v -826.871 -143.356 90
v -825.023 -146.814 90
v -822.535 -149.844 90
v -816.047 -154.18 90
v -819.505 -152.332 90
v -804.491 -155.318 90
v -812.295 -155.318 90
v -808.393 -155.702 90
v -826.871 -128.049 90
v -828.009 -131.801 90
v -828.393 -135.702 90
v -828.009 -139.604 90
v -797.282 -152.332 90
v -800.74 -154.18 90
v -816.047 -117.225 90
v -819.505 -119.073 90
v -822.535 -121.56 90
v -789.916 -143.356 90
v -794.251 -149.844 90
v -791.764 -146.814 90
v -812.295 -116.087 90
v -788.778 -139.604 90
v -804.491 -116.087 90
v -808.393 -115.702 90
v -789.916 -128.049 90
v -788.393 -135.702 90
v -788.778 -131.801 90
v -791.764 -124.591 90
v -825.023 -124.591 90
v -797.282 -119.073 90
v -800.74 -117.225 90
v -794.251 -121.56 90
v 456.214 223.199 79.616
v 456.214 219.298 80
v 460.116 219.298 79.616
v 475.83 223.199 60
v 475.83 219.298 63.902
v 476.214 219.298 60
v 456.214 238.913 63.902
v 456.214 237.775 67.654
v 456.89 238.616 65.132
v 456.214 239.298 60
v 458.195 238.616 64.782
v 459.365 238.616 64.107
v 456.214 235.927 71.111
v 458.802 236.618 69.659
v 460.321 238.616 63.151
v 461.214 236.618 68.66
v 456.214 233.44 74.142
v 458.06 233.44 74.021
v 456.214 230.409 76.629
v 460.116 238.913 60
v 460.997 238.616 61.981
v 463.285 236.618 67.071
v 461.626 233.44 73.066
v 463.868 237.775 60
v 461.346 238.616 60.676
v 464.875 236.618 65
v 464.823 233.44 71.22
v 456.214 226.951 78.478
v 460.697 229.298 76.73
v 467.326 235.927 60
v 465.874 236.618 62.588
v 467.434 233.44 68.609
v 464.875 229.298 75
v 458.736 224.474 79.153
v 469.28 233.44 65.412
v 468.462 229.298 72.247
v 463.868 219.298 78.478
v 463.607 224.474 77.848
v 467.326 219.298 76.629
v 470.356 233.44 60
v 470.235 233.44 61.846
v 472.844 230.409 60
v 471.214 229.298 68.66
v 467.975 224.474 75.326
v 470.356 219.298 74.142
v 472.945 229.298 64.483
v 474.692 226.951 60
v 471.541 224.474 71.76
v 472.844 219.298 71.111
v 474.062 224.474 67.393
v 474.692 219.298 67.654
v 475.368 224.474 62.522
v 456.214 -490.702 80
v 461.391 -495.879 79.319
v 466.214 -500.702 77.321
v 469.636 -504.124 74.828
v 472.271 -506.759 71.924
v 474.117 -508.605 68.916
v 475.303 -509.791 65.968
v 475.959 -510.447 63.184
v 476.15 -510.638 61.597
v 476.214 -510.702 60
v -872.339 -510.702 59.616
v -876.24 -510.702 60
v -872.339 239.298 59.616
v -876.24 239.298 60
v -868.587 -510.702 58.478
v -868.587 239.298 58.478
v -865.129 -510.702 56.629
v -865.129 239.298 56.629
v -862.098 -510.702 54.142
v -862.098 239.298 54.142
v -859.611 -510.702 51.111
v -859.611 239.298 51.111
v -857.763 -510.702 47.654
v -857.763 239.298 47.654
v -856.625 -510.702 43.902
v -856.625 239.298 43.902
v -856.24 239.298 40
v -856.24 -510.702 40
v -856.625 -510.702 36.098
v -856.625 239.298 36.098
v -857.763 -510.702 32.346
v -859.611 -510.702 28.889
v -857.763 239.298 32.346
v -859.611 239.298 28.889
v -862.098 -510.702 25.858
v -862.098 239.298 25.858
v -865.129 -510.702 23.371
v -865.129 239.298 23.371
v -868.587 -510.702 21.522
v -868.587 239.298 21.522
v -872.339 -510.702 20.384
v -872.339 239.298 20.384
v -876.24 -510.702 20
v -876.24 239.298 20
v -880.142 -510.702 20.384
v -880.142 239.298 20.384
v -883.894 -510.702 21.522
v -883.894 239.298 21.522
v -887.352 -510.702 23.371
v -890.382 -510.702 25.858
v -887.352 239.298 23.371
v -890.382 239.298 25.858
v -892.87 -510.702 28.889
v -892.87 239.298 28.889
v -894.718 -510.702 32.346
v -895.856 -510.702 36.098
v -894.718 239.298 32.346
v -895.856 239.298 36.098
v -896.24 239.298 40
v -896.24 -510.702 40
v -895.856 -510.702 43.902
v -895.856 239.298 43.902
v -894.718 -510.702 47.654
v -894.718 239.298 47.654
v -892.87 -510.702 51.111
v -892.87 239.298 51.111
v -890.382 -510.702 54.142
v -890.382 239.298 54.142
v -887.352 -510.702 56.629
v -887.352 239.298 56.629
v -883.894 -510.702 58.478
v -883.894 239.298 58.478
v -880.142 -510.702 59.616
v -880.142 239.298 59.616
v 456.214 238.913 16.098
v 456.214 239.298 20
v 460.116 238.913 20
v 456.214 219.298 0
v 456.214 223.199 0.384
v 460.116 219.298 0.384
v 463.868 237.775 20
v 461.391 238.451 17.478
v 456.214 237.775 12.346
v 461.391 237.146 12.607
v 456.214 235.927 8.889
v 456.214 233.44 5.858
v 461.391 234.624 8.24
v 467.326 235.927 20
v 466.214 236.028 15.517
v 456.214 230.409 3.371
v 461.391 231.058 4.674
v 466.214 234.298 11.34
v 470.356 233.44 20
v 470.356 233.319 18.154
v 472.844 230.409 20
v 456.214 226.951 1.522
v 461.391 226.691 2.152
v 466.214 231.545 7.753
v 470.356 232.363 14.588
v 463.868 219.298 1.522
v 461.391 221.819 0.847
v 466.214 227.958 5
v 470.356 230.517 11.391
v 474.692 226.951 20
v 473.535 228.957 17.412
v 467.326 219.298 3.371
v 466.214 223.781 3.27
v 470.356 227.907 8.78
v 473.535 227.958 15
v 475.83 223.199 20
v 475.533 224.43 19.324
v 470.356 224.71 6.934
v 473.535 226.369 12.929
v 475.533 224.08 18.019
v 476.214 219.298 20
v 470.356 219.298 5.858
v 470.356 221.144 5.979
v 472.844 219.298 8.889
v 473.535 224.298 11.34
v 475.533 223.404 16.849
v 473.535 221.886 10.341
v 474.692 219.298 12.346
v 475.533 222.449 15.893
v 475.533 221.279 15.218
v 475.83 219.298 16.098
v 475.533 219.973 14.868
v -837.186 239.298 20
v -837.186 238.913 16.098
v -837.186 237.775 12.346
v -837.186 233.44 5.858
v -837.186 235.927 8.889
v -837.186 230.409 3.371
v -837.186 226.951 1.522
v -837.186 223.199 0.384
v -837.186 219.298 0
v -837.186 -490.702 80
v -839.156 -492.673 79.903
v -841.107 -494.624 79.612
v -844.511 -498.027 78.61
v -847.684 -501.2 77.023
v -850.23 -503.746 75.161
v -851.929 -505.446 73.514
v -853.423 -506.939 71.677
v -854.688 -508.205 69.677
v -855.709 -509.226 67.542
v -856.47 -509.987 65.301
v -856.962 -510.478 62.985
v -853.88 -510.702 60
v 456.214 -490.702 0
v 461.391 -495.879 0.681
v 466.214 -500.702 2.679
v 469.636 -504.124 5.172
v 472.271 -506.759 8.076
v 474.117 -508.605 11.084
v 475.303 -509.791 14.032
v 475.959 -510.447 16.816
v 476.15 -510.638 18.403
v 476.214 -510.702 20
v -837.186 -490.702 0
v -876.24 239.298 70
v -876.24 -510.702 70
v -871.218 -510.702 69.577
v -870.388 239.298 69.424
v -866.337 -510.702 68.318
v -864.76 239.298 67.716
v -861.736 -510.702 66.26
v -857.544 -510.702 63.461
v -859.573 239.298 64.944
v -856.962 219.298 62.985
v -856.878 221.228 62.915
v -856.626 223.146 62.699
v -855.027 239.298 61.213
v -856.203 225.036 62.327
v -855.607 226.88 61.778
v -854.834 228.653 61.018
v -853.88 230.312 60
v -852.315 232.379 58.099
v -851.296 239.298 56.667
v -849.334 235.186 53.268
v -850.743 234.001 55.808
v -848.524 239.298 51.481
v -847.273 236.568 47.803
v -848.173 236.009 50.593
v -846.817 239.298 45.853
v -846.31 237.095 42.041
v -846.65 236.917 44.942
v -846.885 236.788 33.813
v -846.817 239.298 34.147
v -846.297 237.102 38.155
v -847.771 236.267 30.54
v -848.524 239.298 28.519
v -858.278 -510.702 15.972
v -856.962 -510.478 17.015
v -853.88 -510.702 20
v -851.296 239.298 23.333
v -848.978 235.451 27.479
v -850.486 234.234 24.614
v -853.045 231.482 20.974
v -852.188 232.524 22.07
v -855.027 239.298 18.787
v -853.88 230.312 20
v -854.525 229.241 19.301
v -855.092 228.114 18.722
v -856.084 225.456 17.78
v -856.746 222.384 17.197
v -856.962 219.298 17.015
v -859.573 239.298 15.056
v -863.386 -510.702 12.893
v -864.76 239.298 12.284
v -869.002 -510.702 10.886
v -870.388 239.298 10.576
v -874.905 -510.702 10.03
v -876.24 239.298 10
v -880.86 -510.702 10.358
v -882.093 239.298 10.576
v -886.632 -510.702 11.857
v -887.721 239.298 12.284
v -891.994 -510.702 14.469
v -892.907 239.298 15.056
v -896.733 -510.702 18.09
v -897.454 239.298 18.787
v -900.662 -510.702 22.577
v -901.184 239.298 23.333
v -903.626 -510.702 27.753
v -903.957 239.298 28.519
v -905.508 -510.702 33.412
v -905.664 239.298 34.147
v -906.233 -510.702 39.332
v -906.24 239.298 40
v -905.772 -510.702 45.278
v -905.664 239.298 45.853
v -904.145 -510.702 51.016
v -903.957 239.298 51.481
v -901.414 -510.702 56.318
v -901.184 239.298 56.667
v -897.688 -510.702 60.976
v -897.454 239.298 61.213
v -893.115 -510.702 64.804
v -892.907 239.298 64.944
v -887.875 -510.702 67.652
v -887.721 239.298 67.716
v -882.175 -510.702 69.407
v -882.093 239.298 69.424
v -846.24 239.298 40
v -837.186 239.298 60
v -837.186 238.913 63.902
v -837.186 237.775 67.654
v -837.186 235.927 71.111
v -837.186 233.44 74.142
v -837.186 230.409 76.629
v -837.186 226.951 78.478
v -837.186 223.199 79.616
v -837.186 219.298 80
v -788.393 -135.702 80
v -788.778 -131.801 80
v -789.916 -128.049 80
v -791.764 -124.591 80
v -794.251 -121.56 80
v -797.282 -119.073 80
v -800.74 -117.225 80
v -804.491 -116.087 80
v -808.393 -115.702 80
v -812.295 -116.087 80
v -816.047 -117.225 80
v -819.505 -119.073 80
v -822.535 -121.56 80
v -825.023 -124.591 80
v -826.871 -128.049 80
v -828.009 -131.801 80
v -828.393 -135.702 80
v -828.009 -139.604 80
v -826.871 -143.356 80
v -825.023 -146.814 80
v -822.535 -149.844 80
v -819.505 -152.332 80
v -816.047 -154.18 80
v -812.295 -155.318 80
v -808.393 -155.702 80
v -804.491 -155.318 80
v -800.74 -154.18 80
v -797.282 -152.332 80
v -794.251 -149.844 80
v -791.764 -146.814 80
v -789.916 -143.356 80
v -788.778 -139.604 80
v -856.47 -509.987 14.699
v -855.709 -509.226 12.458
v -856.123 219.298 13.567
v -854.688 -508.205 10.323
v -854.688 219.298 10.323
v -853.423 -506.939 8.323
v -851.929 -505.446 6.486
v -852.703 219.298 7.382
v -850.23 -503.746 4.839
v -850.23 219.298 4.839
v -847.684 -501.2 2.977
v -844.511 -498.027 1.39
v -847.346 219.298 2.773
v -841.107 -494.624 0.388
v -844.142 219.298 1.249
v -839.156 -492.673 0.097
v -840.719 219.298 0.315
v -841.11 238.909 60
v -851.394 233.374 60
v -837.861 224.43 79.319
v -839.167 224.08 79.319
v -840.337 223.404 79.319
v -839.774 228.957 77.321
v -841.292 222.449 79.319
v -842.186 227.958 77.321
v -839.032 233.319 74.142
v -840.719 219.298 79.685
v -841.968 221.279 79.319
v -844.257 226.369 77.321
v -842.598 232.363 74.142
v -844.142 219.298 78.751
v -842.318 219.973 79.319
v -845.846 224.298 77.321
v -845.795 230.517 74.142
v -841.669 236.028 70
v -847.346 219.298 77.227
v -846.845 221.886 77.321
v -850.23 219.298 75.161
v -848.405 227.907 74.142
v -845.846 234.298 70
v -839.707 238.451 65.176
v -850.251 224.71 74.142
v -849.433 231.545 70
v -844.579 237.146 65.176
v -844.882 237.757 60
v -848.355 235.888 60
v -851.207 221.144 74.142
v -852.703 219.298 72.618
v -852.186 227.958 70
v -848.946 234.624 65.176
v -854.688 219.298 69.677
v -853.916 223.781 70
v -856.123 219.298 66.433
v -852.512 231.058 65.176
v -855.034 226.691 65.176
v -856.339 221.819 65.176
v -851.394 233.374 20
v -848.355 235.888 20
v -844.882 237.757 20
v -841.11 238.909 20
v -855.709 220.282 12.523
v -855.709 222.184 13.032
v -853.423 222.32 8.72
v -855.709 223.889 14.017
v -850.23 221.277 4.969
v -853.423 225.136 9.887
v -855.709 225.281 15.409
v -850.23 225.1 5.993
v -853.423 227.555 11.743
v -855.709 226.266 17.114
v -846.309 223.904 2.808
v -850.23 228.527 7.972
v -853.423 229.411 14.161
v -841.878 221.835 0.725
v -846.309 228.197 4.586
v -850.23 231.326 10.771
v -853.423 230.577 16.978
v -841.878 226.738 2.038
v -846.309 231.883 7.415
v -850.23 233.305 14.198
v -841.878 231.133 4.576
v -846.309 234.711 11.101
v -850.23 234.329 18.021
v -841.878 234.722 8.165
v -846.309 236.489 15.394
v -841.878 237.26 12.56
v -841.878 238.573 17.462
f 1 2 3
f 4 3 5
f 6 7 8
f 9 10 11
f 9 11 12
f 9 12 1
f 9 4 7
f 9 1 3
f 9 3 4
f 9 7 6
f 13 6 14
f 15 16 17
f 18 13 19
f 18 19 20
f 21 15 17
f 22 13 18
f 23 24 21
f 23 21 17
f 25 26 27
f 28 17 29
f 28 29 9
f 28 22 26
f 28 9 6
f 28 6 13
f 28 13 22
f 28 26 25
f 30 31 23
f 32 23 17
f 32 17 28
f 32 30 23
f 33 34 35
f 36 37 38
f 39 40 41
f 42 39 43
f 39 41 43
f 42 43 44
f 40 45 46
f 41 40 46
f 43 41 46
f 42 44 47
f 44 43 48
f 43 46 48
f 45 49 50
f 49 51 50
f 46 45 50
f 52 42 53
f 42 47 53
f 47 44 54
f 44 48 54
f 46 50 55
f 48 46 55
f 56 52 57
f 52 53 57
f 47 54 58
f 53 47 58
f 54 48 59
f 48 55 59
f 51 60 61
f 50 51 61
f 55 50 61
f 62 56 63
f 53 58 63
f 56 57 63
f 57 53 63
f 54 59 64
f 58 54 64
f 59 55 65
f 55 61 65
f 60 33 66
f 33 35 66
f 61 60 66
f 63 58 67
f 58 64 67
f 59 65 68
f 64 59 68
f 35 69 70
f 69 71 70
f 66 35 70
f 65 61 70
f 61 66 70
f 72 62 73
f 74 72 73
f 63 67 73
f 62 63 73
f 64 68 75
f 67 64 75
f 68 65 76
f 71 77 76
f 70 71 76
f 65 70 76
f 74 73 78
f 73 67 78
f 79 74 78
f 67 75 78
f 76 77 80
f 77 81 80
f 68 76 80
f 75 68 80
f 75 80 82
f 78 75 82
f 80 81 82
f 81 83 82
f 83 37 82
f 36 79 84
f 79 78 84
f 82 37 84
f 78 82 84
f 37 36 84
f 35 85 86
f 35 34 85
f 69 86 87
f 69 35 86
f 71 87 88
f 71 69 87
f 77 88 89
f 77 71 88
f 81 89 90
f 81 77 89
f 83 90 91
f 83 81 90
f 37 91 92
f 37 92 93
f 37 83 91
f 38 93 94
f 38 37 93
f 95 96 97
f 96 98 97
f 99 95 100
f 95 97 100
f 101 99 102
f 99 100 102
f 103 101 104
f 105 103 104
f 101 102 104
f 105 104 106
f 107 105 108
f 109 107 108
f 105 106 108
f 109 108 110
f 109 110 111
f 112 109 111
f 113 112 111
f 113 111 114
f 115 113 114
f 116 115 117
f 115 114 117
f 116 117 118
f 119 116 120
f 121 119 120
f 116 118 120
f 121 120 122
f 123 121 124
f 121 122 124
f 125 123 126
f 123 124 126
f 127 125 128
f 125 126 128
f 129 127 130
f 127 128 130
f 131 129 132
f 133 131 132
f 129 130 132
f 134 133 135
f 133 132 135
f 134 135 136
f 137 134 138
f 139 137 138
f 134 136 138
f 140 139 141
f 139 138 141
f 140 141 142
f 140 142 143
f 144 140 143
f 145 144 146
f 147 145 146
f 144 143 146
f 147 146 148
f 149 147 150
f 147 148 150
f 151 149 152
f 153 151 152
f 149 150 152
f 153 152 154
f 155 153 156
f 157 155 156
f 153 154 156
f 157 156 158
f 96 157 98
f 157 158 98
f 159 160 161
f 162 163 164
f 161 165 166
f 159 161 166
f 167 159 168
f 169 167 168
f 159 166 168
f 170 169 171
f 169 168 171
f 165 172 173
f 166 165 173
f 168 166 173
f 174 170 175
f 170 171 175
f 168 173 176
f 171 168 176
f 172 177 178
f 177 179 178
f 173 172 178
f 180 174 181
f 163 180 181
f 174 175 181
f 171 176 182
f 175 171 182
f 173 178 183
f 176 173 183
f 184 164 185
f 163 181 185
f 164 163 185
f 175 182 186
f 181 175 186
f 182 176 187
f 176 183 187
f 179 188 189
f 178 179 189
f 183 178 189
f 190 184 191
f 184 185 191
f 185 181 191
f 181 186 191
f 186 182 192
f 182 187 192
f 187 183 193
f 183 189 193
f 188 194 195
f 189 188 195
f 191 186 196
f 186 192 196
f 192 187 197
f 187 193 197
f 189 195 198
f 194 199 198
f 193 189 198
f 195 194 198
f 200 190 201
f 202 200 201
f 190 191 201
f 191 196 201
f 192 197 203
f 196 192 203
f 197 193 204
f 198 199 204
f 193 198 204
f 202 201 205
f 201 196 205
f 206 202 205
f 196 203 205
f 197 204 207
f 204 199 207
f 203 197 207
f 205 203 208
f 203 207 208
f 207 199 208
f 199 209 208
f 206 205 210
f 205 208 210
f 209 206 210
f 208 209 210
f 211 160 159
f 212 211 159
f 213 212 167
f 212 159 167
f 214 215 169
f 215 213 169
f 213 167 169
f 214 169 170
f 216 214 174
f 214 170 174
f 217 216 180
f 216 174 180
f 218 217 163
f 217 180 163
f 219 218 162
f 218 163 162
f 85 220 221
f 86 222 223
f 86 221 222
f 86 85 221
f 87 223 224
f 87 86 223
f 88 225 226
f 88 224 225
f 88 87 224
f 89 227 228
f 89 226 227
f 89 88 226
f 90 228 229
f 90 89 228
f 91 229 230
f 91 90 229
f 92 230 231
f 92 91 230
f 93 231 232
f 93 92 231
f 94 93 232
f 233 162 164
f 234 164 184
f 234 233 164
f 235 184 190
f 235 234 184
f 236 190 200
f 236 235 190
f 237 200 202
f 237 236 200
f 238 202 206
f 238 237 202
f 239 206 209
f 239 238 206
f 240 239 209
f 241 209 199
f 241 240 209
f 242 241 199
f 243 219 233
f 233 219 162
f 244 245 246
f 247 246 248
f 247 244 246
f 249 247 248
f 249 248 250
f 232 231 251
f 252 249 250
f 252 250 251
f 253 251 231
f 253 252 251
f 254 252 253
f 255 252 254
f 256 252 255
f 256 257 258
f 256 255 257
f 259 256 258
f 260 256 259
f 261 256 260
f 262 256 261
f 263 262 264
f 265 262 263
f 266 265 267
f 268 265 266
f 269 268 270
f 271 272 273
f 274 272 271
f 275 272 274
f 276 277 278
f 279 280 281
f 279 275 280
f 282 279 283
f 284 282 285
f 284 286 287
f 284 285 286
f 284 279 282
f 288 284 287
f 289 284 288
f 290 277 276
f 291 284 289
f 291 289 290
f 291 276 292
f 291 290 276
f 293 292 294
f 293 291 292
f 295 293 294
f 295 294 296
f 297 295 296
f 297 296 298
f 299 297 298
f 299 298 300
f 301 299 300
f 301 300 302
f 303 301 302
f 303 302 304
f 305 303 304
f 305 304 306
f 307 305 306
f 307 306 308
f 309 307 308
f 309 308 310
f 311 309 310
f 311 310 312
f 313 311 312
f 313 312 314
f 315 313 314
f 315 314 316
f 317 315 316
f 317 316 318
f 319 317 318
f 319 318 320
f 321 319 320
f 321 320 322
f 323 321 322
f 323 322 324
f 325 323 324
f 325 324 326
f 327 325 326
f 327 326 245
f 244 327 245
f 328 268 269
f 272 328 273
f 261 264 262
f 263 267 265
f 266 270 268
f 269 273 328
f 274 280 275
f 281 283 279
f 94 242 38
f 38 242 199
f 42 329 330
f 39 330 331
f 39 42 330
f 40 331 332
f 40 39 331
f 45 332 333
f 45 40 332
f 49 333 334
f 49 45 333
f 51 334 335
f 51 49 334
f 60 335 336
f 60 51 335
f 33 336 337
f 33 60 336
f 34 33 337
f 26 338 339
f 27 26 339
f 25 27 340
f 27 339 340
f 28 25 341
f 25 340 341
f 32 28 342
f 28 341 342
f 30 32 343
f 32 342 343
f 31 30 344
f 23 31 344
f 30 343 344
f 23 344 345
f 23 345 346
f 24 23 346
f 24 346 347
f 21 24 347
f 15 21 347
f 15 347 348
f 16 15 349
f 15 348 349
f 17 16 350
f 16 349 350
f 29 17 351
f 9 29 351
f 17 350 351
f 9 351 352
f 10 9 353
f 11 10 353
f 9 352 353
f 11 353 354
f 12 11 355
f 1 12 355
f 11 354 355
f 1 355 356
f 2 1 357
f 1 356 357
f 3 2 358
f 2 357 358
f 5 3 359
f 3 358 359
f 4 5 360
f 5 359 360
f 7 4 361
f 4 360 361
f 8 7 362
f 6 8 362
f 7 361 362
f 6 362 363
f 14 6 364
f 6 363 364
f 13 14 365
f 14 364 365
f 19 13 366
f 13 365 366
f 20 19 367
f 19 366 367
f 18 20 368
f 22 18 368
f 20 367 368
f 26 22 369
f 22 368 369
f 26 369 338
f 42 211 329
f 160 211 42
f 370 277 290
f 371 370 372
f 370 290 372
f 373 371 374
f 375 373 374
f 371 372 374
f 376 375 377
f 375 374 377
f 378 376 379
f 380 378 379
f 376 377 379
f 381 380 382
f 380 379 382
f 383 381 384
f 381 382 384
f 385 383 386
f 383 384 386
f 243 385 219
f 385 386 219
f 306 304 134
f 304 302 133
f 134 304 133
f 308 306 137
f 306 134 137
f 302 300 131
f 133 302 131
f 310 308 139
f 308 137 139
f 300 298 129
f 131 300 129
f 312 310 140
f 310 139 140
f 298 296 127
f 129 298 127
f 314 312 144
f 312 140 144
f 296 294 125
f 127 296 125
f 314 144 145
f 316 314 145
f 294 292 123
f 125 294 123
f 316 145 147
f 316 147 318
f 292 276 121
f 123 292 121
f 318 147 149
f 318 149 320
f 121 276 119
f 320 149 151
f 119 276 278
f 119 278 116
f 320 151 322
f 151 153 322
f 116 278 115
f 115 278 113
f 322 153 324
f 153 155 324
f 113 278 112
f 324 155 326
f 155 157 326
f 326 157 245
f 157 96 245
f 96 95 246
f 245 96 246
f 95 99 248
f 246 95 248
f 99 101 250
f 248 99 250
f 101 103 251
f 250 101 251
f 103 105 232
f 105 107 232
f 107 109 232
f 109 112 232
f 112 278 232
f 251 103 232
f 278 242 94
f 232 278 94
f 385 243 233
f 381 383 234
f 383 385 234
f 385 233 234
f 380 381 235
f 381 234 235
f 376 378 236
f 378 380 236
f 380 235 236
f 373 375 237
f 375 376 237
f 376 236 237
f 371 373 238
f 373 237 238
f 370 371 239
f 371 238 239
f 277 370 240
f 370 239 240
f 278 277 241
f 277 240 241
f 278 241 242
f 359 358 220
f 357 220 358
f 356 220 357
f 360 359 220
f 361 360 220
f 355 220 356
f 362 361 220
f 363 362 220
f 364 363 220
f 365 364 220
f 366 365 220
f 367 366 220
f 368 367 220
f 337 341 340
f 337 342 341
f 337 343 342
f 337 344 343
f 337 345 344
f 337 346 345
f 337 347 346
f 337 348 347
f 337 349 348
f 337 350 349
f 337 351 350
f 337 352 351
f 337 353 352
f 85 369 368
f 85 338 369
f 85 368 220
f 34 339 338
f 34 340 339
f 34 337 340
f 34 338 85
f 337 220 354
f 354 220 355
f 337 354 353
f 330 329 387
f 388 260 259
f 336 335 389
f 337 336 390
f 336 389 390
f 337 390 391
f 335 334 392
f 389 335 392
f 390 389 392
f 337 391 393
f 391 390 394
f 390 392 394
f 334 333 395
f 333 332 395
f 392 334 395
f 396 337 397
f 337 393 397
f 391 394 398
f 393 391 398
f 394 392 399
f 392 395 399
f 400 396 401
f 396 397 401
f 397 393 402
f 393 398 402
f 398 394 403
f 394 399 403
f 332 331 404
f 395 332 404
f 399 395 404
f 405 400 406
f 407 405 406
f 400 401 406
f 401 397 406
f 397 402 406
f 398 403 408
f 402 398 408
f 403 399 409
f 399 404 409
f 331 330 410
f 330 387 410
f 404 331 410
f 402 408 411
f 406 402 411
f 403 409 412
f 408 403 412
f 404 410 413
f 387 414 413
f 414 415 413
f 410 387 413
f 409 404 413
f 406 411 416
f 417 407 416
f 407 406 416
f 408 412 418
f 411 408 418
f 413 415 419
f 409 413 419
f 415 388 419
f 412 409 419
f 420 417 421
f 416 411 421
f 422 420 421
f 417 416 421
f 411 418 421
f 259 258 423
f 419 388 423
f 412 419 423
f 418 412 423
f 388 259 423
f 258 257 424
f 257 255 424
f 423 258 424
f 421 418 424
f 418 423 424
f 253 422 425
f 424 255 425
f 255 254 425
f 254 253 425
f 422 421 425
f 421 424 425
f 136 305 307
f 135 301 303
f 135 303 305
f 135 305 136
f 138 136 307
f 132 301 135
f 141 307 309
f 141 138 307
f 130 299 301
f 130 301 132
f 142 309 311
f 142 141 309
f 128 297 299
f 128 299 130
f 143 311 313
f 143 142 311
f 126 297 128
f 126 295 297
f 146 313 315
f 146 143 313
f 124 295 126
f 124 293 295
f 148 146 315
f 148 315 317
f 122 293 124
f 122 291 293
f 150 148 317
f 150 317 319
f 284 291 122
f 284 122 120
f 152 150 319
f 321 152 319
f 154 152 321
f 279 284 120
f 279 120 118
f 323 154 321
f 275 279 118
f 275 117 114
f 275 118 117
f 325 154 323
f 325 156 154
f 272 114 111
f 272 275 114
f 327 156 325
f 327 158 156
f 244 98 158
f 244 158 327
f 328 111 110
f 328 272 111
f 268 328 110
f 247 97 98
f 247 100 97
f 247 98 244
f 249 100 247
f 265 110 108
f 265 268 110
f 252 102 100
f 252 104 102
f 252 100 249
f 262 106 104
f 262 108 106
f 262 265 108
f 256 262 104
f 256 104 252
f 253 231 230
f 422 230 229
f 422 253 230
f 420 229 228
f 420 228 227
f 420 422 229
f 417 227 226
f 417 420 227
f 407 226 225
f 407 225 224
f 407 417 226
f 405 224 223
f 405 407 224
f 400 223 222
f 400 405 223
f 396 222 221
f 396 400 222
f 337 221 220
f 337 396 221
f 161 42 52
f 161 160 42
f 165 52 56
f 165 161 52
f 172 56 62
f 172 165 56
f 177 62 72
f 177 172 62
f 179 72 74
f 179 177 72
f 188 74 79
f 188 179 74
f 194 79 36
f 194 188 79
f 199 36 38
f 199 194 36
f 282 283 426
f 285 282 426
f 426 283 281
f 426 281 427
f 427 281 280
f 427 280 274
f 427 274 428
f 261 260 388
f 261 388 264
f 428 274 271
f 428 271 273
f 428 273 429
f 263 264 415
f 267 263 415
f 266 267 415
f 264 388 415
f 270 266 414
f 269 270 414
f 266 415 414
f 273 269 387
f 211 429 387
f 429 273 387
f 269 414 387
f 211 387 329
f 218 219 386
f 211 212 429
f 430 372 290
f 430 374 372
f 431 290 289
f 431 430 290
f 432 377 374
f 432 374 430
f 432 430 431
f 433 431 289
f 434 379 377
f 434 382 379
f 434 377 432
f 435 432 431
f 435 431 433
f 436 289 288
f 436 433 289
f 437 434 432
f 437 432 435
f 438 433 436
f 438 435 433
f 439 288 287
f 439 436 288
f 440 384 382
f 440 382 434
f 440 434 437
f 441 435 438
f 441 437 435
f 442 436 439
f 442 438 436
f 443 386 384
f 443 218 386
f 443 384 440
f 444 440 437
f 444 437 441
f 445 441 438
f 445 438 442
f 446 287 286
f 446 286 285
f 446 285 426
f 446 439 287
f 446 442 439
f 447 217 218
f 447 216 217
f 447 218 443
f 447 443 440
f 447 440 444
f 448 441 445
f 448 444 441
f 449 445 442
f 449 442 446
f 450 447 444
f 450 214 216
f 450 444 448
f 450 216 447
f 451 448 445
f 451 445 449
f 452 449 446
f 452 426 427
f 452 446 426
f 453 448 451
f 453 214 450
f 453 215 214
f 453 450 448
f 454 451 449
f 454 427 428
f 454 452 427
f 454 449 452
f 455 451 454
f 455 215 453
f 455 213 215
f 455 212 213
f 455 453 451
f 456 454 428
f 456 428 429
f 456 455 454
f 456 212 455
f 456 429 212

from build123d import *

# Parameters (mm, degrees)
SKETCH1_W           = 1333.4
SKETCH1_H           = 750
BOSS_EXTRUDE1_DEPTH = 80
FILLET1_R           = 20
FILLET2_R           = 20
SKETCH2_R           = 30
SKETCH2_R_2         = 20
BOSS_EXTRUDE2_DEPTH = 750
SKETCH3_R           = 20
CUT_EXTRUDE1_DEPTH  = 750
SKETCH4_R           = 20
BOSS_EXTRUDE3_DEPTH = 10


with BuildPart() as part:
    # Sketch1 → Boss-Extrude1 (new body)
    with BuildSketch(Plane.XY):
        with Locations((-190.485714286, -135.702321429)):
            Rectangle(SKETCH1_W, SKETCH1_H)
    extrude(amount=BOSS_EXTRUDE1_DEPTH)

    # Fillet1
    fillet1_edges = [part.edges().sort_by_distance(p)[0] for p in [
        (-190.485714286, 239.297678571, 0),
    ]]
    fillet(fillet1_edges, radius=FILLET1_R)

    # Fillet2
    fillet2_edges = [part.edges().sort_by_distance(p)[0] for p in [
        (476.214285714, -135.702321429, 80),
        (-857.185714286, -145.702321429, 0),
        (-190.485714286, 239.297678571, 80),
        (476.214285714, 233.439814195, 5.857864376),
        (-857.185714286, 233.439814195, 5.857864376),
        (-857.185714286, -135.702321429, 80),
        (476.214285714, -145.702321429, 0),
        (-190.485714286, -510.702321429, 0),
        (-857.185714286, 239.297678571, 50),
        (476.214285714, 239.297678571, 50),
        (-190.485714286, -510.702321429, 80),
    ]]
    fillet(fillet2_edges, radius=FILLET2_R)

    # Sketch2 → Boss-Extrude2 (add)
    with BuildSketch(Plane(origin=(0, 239.297678571, 0), x_dir=(1, 0, 0), z_dir=(0, 1, 0))):
        with Locations(Location((-876.240324271, -40, 0), (0, 0, 270))):
            Circle(SKETCH2_R)
        with Locations(Location((-876.240324271, -40, 0), (0, 0, 270))):
            Circle(SKETCH2_R_2, mode=Mode.SUBTRACT)
    extrude(amount=-BOSS_EXTRUDE2_DEPTH)

    # Sketch3 → Cut-Extrude1 (cut)
    with BuildSketch(Plane(origin=(0, 239.297678571, 0), x_dir=(1, 0, 0), z_dir=(0, 1, 0))):
        with Locations(Location((-876.240324271, -40, 0), (0, 0, 270))):
            Circle(SKETCH3_R)
    extrude(amount=-CUT_EXTRUDE1_DEPTH, mode=Mode.SUBTRACT)

    # Sketch4 → Boss-Extrude3 (add)
    with BuildSketch(Plane.XY.offset(80)):
        with Locations((-808.393239531, -135.702321429)):
            Circle(SKETCH4_R)
    extrude(amount=BOSS_EXTRUDE3_DEPTH)


solid = part.part
